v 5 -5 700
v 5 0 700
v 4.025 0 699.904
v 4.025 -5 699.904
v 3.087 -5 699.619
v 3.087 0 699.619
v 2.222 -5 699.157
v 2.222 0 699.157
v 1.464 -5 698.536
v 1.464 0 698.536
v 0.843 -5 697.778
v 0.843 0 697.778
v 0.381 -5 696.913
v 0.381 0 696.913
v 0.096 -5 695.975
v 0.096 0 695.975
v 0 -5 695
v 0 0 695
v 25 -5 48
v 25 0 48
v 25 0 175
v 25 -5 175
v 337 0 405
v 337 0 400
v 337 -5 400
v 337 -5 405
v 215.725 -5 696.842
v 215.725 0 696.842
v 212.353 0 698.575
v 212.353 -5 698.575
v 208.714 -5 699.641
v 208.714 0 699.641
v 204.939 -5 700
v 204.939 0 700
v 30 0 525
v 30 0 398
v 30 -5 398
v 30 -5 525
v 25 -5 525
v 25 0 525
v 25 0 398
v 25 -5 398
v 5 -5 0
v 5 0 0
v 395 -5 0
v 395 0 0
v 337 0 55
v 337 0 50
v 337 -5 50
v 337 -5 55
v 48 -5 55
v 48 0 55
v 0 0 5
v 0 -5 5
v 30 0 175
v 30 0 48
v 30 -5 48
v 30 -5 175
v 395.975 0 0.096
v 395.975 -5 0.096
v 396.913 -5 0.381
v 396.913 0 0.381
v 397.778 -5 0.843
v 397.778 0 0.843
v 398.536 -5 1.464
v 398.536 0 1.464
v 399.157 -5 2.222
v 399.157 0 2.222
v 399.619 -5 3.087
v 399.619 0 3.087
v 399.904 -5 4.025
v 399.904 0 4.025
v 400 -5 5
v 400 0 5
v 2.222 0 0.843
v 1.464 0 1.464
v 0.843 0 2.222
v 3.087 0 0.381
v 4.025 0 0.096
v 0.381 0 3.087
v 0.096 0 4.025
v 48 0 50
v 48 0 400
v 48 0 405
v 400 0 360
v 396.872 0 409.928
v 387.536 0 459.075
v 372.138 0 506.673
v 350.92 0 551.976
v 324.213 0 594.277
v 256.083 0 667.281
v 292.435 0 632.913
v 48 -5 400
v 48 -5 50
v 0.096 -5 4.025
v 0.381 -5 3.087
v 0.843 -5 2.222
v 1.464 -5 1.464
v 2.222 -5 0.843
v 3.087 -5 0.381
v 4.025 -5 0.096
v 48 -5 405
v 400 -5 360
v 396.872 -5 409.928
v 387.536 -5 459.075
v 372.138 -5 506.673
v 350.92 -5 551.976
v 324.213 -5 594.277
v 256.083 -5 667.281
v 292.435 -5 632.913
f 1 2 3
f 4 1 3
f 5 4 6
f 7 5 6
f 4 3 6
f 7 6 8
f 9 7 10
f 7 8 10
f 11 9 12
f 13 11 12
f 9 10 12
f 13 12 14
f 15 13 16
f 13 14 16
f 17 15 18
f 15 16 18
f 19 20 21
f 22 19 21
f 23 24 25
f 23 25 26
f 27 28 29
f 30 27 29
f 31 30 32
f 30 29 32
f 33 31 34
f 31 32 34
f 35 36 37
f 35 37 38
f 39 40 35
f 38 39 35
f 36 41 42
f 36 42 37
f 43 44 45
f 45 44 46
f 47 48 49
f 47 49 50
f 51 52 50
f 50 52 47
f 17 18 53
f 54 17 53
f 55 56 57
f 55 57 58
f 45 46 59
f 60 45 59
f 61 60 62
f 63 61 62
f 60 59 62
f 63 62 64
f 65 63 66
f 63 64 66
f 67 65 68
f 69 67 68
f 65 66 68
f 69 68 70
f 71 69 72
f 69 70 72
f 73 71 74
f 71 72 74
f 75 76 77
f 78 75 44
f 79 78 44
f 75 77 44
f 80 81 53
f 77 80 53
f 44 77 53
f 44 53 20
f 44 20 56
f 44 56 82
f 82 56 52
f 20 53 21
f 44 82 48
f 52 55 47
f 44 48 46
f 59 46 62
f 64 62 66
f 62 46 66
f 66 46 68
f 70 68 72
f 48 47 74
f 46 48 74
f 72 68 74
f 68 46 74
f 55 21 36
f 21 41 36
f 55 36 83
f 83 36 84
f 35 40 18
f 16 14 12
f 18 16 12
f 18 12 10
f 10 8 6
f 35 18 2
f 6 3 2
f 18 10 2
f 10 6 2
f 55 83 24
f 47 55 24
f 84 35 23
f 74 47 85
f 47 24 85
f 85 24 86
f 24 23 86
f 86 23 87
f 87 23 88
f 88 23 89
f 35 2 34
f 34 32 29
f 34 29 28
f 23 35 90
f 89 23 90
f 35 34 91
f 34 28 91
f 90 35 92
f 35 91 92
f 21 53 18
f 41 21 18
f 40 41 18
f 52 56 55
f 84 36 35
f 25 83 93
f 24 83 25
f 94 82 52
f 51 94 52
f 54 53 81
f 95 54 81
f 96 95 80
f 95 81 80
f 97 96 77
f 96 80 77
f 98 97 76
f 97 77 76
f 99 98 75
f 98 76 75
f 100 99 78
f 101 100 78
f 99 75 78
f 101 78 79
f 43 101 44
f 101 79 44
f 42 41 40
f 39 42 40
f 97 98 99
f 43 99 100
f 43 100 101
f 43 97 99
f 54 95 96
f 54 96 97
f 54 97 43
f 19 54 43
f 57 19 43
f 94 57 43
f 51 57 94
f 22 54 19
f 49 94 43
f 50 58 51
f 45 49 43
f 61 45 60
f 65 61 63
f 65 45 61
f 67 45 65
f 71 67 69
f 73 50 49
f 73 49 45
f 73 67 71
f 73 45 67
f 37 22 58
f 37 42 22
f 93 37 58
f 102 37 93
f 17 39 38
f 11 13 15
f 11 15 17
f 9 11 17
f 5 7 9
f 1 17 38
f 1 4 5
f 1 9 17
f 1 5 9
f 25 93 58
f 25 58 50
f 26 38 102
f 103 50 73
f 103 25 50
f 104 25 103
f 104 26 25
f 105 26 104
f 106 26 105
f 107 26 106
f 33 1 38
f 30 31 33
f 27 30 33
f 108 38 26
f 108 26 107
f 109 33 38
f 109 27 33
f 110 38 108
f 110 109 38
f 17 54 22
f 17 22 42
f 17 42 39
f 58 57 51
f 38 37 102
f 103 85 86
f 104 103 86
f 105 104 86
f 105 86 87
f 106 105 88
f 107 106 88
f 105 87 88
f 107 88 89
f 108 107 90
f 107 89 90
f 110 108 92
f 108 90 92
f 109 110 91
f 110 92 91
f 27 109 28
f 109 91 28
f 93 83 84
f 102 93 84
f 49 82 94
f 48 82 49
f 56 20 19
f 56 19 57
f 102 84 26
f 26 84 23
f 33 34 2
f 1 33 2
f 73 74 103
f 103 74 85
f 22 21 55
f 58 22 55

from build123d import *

# Parameters (mm, degrees)
F0_W     = 5
F0_H     = 127
F0_W_2   = 289
F0_H_2   = 5
F1_DEPTH = 5


with BuildPart() as f1:
    # F0 (on Front) → F1 (new body)
    with BuildSketch(Plane.XZ):
        with BuildLine():
            ThreePointArc((0, 5), (1.464466, 1.464466), (5, 0))
            Line((5, 0), (395, 0))
            ThreePointArc((395, 0), (398.535534, 1.464466), (400, 5))
            Line((400, 5), (400, 360))
            ThreePointArc((400, 360), (350.920298, 551.976416), (215.725279, 696.842105))
            ThreePointArc((215.725279, 696.842105), (210.55853, 699.194297), (204.939015, 700))
            Line((204.939015, 700), (5, 700))
            ThreePointArc((5, 700), (1.464466, 698.535534), (0, 695))
            Line((0, 695), (0, 5))
        make_face()
        with Locations((27.5, 111.5)):
            Rectangle(F0_W, F0_H, mode=Mode.SUBTRACT)
        with Locations((192.5, 52.5)):
            Rectangle(F0_W_2, F0_H_2, mode=Mode.SUBTRACT)
        with Locations((27.5, 461.5)):
            Rectangle(F0_W, F0_H, mode=Mode.SUBTRACT)
        with Locations((192.5, 402.5)):
            Rectangle(F0_W_2, F0_H_2, mode=Mode.SUBTRACT)
    extrude(amount=F1_DEPTH)


solid = f1.part
